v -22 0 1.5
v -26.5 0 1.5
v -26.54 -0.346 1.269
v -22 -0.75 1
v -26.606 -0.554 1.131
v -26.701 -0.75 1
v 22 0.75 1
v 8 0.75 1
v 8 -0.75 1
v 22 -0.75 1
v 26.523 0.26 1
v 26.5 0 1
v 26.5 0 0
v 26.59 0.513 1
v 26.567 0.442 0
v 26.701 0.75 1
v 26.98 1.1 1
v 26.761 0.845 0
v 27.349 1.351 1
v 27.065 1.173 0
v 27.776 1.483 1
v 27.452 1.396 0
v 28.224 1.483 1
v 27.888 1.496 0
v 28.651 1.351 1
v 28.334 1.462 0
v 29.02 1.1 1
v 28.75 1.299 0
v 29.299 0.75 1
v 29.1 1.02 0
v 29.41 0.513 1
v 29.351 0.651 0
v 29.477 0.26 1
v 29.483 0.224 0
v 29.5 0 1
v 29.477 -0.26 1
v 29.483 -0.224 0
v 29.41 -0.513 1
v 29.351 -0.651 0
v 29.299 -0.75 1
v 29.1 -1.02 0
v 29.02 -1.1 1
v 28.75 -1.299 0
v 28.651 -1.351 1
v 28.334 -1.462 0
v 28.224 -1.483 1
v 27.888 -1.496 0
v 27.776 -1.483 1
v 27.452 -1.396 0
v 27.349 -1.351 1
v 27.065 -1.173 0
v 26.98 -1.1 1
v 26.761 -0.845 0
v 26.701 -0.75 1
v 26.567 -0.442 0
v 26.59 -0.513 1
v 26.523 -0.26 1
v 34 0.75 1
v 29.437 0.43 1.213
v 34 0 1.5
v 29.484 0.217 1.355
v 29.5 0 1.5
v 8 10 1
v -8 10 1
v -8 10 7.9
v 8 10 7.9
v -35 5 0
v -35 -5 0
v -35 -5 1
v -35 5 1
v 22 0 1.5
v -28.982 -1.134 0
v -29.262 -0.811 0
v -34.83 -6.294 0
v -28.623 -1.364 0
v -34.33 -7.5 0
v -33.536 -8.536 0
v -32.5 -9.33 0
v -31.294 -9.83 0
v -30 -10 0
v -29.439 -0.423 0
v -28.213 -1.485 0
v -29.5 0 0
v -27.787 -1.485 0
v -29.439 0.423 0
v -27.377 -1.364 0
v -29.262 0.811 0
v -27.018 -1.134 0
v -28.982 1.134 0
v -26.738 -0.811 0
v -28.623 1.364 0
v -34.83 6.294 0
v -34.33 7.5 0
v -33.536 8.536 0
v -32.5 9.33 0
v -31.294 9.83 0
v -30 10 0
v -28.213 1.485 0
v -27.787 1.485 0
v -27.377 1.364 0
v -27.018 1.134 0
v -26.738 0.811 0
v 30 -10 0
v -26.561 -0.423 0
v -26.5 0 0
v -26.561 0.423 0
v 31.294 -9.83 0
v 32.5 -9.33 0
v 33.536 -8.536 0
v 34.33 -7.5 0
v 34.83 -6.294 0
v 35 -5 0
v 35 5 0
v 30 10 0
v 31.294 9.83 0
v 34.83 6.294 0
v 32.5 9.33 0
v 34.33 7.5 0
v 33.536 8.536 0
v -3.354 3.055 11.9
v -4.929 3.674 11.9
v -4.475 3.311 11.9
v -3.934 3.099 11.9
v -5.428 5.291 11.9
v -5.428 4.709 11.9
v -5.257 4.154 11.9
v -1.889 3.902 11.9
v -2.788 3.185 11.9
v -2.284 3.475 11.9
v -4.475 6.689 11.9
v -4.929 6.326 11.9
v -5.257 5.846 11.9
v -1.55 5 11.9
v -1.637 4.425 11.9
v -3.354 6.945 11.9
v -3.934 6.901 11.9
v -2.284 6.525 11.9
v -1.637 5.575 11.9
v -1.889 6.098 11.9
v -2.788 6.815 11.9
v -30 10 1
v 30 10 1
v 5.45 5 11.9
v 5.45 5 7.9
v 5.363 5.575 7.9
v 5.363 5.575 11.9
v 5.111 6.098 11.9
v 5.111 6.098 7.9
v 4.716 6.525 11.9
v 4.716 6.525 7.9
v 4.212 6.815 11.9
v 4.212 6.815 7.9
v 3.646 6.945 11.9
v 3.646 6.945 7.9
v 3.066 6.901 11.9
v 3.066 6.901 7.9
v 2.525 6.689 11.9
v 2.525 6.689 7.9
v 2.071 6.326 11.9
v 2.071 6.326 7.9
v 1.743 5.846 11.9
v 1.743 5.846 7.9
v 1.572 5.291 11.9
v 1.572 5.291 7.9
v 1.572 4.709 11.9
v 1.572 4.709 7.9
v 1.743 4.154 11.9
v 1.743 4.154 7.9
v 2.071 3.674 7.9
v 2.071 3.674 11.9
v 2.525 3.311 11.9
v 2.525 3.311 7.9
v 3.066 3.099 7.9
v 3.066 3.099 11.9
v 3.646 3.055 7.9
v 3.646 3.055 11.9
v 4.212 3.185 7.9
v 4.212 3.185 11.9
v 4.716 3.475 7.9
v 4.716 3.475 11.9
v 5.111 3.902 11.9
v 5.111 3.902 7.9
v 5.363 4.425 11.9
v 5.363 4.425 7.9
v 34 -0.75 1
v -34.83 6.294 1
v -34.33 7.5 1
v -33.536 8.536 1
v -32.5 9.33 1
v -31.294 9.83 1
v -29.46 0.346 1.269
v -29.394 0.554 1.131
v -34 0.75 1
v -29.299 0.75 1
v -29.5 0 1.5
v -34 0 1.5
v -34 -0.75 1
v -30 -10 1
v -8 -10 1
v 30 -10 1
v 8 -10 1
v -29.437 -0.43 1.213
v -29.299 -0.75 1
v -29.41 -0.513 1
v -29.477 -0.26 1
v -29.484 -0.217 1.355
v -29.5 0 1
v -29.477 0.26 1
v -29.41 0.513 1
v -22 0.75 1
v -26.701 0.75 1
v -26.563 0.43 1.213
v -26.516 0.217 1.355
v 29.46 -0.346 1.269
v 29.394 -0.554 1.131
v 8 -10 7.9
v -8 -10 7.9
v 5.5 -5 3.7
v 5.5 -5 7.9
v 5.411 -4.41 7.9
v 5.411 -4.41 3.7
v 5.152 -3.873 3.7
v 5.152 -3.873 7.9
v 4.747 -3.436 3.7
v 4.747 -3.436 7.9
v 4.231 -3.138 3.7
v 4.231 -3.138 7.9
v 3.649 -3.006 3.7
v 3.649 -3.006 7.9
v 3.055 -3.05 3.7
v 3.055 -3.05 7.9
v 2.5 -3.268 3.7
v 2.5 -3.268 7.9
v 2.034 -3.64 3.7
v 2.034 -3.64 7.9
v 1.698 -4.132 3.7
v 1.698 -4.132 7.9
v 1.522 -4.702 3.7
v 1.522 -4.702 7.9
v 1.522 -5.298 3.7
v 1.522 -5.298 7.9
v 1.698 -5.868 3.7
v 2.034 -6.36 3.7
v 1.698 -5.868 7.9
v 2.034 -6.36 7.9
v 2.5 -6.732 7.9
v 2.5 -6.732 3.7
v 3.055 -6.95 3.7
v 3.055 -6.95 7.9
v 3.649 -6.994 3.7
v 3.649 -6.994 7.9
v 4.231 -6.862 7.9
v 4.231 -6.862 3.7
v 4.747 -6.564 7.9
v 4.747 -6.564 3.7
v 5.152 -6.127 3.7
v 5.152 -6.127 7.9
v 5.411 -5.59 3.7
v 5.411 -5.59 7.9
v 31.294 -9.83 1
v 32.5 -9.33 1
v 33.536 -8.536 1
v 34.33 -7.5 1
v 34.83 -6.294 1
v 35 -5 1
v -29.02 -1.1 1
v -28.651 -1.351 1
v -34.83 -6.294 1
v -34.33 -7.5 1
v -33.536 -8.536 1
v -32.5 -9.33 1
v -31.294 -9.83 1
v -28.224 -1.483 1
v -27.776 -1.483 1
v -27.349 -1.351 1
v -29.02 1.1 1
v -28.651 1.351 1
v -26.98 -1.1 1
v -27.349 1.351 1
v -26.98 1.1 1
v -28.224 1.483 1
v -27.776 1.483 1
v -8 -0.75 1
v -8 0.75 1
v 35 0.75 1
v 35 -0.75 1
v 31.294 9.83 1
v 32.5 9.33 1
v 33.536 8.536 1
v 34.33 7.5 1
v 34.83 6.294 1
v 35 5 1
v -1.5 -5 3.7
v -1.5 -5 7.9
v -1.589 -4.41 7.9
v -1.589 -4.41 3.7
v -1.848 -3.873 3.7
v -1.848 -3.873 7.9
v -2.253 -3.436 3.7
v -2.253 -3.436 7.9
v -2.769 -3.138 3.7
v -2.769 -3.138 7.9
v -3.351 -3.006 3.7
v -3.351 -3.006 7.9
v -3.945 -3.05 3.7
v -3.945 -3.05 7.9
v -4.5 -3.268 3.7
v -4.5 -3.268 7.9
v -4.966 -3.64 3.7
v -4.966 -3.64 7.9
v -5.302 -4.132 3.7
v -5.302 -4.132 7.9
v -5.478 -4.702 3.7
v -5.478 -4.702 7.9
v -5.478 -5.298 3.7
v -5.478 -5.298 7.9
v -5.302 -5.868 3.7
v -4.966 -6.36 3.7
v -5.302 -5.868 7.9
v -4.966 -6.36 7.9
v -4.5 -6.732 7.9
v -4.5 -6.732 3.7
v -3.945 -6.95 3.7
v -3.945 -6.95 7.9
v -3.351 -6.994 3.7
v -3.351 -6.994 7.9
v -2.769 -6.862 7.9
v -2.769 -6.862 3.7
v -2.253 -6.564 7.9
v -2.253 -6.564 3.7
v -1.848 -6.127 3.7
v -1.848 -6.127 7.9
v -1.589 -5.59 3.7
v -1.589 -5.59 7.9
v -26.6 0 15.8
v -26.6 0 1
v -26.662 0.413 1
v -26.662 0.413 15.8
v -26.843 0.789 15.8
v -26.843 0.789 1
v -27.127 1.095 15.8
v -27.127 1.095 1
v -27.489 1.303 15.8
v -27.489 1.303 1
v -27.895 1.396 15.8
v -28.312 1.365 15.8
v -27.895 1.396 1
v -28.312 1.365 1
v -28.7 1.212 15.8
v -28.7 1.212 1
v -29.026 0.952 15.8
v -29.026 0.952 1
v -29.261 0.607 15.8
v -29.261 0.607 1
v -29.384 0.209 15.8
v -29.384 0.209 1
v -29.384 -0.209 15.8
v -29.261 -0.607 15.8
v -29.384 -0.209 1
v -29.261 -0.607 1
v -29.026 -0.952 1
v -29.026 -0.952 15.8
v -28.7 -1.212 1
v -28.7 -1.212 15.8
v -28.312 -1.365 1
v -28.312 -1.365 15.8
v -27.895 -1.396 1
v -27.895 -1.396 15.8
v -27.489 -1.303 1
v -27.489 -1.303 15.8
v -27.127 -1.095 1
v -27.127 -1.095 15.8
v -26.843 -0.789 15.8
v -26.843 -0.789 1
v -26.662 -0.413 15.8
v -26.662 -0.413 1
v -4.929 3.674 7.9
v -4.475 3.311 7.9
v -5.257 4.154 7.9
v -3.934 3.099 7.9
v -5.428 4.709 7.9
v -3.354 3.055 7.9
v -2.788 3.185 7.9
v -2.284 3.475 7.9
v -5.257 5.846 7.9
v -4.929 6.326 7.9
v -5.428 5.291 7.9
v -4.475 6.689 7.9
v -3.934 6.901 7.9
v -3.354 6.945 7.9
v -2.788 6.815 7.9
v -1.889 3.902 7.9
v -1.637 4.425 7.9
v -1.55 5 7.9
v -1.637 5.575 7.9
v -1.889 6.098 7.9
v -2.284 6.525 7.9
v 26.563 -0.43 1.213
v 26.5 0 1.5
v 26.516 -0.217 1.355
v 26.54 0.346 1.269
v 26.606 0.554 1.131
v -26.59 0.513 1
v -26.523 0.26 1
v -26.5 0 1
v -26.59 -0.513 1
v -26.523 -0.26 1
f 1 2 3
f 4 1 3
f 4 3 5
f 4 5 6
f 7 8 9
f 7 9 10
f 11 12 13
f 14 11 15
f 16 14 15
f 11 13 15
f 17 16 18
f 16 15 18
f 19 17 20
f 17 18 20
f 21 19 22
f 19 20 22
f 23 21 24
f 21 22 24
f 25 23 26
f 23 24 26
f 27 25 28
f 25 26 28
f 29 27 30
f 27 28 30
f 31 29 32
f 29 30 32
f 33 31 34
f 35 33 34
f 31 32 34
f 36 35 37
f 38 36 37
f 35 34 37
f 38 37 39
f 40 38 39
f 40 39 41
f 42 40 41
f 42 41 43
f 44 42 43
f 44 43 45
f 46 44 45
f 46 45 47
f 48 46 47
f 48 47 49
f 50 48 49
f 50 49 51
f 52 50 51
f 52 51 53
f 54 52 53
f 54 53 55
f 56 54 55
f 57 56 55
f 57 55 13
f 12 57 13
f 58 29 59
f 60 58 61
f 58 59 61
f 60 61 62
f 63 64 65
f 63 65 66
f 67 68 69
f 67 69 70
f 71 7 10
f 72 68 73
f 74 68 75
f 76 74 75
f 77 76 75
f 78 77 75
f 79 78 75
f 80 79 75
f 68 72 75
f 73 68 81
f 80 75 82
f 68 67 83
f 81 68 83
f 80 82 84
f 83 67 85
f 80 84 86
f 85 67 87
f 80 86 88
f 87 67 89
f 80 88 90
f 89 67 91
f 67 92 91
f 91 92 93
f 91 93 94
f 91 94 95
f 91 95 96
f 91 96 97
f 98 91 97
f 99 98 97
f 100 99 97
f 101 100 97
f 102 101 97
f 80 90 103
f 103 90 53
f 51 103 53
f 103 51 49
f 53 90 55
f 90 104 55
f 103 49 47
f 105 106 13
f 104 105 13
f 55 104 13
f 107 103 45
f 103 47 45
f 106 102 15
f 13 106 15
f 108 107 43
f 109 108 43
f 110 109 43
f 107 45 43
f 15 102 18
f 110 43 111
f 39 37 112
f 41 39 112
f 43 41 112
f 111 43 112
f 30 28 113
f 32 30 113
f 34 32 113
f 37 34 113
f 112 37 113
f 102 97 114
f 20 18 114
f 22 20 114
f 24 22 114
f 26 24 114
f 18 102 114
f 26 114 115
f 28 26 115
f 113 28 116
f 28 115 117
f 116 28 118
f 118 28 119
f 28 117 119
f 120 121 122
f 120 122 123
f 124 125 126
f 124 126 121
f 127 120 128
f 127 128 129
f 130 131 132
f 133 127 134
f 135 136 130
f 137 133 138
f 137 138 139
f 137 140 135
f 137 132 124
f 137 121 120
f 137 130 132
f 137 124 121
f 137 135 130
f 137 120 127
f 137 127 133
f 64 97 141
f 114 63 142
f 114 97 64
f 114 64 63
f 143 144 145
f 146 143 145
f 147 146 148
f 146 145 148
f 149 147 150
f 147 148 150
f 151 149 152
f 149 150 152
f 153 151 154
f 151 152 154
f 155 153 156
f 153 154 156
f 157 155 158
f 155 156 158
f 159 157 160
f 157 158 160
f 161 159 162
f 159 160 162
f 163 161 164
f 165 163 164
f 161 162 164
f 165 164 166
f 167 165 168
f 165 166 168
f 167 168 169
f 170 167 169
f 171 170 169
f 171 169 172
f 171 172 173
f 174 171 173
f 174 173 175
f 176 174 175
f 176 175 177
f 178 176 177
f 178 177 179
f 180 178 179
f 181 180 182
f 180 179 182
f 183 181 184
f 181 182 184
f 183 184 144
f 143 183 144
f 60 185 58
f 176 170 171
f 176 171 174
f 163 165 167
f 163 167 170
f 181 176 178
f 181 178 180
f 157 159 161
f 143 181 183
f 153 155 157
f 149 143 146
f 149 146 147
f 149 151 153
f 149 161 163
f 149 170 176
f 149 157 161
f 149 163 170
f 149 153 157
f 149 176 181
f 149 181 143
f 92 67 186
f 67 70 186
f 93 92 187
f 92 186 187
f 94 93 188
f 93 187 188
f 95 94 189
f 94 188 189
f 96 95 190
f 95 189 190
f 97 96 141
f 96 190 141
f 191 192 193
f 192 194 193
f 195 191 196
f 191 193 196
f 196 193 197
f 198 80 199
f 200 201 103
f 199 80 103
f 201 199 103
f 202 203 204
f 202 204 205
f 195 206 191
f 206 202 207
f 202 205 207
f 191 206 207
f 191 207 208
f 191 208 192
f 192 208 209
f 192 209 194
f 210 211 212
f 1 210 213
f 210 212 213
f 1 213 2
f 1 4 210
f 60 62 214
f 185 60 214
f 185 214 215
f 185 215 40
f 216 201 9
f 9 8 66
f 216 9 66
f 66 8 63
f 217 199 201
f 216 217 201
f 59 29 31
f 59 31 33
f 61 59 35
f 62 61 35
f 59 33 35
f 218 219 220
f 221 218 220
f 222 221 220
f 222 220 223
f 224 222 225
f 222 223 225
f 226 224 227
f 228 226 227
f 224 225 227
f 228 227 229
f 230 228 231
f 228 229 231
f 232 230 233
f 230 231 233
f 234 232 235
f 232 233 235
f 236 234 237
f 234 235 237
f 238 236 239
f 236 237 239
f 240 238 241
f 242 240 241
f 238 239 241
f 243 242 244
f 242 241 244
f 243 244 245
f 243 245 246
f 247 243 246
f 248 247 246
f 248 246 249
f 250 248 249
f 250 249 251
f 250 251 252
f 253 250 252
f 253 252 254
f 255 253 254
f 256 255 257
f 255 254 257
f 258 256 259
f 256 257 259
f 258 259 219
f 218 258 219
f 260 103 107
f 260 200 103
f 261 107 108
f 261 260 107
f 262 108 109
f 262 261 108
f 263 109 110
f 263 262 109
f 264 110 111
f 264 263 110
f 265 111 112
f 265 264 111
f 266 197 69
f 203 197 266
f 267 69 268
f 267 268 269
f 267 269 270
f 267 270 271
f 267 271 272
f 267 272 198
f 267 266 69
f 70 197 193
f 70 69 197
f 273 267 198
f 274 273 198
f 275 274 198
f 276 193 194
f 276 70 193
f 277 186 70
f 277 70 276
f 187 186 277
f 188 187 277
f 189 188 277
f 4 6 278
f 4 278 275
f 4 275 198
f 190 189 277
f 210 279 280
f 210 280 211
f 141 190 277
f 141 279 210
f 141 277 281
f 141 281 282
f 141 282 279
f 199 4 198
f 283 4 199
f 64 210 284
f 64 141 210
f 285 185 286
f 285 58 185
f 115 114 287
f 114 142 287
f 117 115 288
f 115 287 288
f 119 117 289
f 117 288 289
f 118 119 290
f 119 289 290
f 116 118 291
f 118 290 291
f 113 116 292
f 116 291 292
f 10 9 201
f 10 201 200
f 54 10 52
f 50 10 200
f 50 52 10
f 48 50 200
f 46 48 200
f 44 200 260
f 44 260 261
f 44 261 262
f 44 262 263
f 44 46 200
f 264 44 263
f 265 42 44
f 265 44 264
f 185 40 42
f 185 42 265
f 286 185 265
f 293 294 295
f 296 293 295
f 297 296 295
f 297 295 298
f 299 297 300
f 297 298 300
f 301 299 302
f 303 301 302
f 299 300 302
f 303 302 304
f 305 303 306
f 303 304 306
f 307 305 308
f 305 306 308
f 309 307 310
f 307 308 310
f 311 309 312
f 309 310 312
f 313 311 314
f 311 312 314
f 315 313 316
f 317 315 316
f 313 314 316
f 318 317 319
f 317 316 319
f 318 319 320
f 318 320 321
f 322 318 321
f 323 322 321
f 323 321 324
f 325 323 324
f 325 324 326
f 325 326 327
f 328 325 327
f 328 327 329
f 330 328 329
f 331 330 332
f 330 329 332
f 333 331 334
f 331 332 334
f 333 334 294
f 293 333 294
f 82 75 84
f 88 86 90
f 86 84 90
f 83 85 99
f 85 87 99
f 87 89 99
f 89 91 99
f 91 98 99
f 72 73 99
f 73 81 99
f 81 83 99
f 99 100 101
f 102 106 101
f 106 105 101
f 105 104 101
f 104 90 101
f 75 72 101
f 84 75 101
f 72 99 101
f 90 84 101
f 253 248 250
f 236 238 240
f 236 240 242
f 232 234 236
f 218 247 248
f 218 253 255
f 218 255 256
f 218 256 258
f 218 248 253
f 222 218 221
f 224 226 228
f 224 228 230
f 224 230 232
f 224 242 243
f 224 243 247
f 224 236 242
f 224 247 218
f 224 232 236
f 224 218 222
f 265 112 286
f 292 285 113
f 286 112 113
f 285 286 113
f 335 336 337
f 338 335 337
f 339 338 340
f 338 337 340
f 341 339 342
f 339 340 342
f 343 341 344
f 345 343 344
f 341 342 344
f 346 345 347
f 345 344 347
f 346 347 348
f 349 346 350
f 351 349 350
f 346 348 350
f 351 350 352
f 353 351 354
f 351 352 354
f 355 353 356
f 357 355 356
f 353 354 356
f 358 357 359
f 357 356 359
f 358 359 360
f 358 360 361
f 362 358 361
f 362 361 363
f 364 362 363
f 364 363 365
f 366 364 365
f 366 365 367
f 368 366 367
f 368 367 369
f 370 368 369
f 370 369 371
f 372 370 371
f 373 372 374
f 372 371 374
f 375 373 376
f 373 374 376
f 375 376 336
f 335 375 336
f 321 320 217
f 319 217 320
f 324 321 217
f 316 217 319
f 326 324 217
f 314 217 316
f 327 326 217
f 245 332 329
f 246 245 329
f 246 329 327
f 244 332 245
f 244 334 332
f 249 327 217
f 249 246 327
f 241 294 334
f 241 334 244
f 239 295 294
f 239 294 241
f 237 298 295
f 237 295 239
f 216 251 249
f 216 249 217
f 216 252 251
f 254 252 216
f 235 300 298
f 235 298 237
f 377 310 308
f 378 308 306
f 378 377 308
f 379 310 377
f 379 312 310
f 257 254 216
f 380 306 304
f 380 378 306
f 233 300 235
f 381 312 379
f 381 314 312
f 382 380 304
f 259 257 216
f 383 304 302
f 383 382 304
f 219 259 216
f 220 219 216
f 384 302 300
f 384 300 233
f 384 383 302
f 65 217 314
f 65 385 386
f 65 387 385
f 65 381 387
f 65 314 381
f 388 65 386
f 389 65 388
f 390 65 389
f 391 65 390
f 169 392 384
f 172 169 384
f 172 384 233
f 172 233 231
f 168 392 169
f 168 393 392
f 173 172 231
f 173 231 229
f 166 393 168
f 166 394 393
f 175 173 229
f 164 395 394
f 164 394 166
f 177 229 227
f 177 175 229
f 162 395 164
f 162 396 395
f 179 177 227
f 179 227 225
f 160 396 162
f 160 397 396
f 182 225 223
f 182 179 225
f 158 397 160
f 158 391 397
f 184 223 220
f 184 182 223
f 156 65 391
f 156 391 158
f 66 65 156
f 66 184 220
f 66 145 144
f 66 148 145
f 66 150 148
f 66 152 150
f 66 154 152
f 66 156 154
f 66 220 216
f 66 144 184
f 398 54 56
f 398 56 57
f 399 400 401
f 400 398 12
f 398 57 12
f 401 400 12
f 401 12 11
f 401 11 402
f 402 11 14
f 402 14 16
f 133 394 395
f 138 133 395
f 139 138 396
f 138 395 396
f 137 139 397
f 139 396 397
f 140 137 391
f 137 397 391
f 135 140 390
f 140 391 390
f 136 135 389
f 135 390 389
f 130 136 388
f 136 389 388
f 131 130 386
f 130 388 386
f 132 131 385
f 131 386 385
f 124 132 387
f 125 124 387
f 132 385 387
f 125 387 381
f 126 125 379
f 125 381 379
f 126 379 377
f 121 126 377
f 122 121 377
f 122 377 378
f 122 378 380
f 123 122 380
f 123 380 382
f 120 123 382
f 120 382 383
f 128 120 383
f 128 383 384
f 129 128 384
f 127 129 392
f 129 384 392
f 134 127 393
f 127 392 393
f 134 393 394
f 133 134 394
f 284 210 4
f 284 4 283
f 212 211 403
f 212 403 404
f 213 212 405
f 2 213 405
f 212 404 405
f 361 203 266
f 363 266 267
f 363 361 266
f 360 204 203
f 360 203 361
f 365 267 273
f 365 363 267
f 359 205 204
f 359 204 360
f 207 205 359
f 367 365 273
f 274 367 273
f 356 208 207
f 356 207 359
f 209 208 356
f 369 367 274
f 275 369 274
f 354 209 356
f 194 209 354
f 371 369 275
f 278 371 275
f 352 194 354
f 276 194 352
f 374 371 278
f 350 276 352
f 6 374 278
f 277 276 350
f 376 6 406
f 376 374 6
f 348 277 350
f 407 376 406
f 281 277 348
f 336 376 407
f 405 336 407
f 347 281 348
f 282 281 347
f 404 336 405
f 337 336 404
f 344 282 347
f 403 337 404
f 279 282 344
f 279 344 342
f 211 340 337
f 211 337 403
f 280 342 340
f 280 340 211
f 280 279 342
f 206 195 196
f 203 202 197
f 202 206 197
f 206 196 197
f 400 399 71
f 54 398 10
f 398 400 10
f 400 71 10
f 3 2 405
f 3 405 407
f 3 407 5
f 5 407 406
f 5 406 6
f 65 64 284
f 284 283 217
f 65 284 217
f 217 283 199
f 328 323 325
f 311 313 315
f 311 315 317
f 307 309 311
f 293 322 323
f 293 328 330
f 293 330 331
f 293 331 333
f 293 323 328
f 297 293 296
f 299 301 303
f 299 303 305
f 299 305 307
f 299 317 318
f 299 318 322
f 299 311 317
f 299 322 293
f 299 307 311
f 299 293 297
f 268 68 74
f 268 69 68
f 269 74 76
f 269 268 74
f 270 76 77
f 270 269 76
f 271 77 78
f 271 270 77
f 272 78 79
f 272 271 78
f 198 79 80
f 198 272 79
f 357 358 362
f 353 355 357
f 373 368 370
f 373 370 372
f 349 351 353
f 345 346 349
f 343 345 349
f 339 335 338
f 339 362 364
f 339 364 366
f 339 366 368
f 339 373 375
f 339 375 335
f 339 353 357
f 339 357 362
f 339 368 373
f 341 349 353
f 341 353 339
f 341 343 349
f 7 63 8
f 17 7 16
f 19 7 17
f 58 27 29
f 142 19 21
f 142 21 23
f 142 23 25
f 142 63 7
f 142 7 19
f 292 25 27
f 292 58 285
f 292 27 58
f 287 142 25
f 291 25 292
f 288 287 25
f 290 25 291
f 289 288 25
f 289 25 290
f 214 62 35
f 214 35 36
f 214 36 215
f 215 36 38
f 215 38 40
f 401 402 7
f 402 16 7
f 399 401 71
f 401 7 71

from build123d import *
from build123d import SkipClean  # not in build123d's __all__

# Parameters (mm, degrees)
F0_W      = 70
F0_H      = 20
F1_DEPTH  = 1
F3_D      = 3
F4_R      = 5
F7_DEPTH  = 0.5
F9_DEPTH  = 69.001
F10_W     = 16
F10_H     = 9.25
F10_H_2   = 1.5
F11_DEPTH = 6.9
F12_R     = 1.95
F13_DEPTH = 4
F14_R     = 2
F15_DEPTH = 4.2
F16_R     = 1.5
F17_DEPTH = 1
F18_R     = 1.4
F19_DEPTH = 14.8


with BuildPart() as f1:
    # F0 (on Top) → F1 (new body)
    with BuildSketch(Plane.XY):
        Rectangle(F0_W, F0_H)
    extrude(amount=F1_DEPTH)

    # F3 (through all)
    with Locations(Plane.XY.offset(1)):
        with Locations((-28, 0), (28, 0)):
            Hole(F3_D / 2)

    # F4
    f4_edges = [f1.edges().sort_by_distance(p)[0] for p in [
        (-35, 10, 0.5),
        (-35, -10, 0.5),
        (35, 10, 0.5),
        (35, -10, 0.5),
    ]]
    fillet(f4_edges, radius=F4_R)

    # F5 (on face) + F6 (on face) → F7 (join)
    with BuildSketch(Plane.XY.offset(1)):
        with BuildLine():
            Line((-29.2990381057, 0.75), (-34, 0.75))
            Line((-34, 0.75), (-34, -0.75))
            Line((-34, -0.75), (-29.2990381057, -0.75))
            ThreePointArc((-29.2990381057, -0.75), (-29.5, 0), (-29.2990381057, 0.75))
        make_face()
        with BuildLine():
            Line((-22, 0.75), (-26.7009618943, 0.75))
            ThreePointArc((-26.7009618943, 0.75), (-26.5511112606, 0.3882285677), (-26.5, 0))
            ThreePointArc((-26.5, 0), (-26.5511112606, -0.3882285677), (-26.7009618943, -0.75))
            Line((-26.7009618943, -0.75), (-22, -0.75))
            Line((-22, -0.75), (-22, 0.75))
        make_face()
    with BuildSketch(Plane.XY.offset(1)):
        with BuildLine():
            Line((26.7009618943, 0.75), (22, 0.75))
            Line((22, 0.75), (22, -0.75))
            Line((22, -0.75), (26.7009618943, -0.75))
            ThreePointArc((26.7009618943, -0.75), (26.5, 0), (26.7009618943, 0.75))
        make_face()
        with BuildLine():
            Line((34, 0.75), (29.2990381057, 0.75))
            ThreePointArc((29.2990381057, 0.75), (29.4488887394, 0.3882285677), (29.5, 0))
            ThreePointArc((29.5, 0), (29.4488887394, -0.3882285677), (29.2990381057, -0.75))
            Line((29.2990381057, -0.75), (34, -0.75))
            Line((34, -0.75), (34, 0.75))
        make_face()
    with SkipClean():  # cleaning this boolean's faces spoils the solid; the shape is the same uncleaned
        extrude(amount=F7_DEPTH)

    # F8 (on face) → F9 (cut, through all)
    with BuildSketch(Plane(origin=(-34, 0, 0), x_dir=(0, -1, 0), z_dir=(-1, 0, 0))):
        Polygon((-0.75, 1.5), (-0.75, 1), (0, 1.5), align=None)
        Polygon((0.75, 1.5), (0, 1.5), (0.75, 1), align=None)
    with SkipClean():  # cleaning this boolean's faces spoils the solid; the shape is the same uncleaned
        extrude(amount=-F9_DEPTH, mode=Mode.SUBTRACT)

    # F10 (on face) → F11 (join)
    with BuildSketch(Plane.XY.offset(1)):
        with Locations((0, -5.375)):
            Rectangle(F10_W, F10_H)
        Rectangle(F10_W, F10_H_2)
        with Locations((0, 5.375)):
            Rectangle(F10_W, F10_H)
    with SkipClean():  # cleaning this boolean's faces spoils the solid; the shape is the same uncleaned
        extrude(amount=F11_DEPTH)

    # F12 (on face) → F13 (join)
    with BuildSketch(Plane.XY.offset(7.9)):
        with Locations((-3.5, 5)):
            Circle(F12_R)
        with Locations((3.5, 5)):
            Circle(F12_R)
    with SkipClean():  # cleaning this boolean's faces spoils the solid; the shape is the same uncleaned
        extrude(amount=F13_DEPTH)

    # F14 (on face) → F15 (cut)
    with BuildSketch(Plane.XY.offset(7.9)):
        with Locations((-3.5, -5)):
            Circle(F14_R)
        with Locations((3.5, -5)):
            Circle(F14_R)
    with SkipClean():  # cleaning this boolean's faces spoils the solid; the shape is the same uncleaned
        extrude(amount=-F15_DEPTH, mode=Mode.SUBTRACT)

    # F16 (on face) → F17 (join)
    with BuildSketch(Plane.XY.offset(1)):
        with Locations((-28, 0)):
            Circle(F16_R)
    with SkipClean():  # cleaning this boolean's faces spoils the solid; the shape is the same uncleaned
        extrude(amount=-F17_DEPTH)

    # F18 (on face) → F19 (join)
    with BuildSketch(Plane.XY.offset(1)):
        with Locations((-28, 0)):
            Circle(F18_R)
    with SkipClean():  # cleaning this boolean's faces spoils the solid; the shape is the same uncleaned
        extrude(amount=F19_DEPTH)


solid = f1.part
